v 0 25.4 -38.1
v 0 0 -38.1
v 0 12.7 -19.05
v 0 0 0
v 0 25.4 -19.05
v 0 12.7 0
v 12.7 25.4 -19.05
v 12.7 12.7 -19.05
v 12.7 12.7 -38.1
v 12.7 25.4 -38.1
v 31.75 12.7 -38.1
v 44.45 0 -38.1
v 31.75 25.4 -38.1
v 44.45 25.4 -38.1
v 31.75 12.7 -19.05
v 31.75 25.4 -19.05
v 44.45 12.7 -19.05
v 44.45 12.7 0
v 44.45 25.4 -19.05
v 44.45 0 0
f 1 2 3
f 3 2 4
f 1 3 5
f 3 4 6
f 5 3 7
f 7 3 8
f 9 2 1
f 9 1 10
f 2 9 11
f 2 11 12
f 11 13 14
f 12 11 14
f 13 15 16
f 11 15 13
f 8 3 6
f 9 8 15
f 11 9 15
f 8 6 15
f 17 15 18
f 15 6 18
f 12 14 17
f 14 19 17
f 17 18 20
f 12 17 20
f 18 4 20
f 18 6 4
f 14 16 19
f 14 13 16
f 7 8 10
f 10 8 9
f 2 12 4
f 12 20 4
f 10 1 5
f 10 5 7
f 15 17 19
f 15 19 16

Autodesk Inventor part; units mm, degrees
ref_plane "YZ Plane" through (0, 0, 0) normal (1, 0, 0) x (0, 1, 0)
ref_plane "XZ Plane" through (0, 0, 0) normal (0, 1, 0) x (-1, 0, 0)
ref_plane "XY Plane" through (0, 0, 0) normal (0, 0, 1) x (1, 0, 0)
sketch "Sketch1" plane through (0, 0, 0) normal (0, 0, 1) x (1, 0, 0)
  line L0 (0, 12.7) -> (44.45, 12.7)
  line L1 (44.45, 12.7) -> (44.45, 0)
  line L2 (44.45, 0) -> (0, 0)
  line L3 (0, 0) -> (0, 12.7)
  dimension "d0" = 44.45
  dimension "d1" = 12.7
extrude "Extrusion1" add sketch "Sketch1" against normal blind 38.1
sketch "Sketch2" plane through (0, 12.7, 0) normal (0, 1, 0) x (1, 0, 0)
  line L0 (0, 0) -> (0, 38.1) projected
  line L1 (0, 38.1) -> (44.45, 38.1) projected
  line L2 (0, 19.05) -> (12.7, 19.05)
  line L3 (12.7, 19.05) -> (12.7, 38.1)
  line L4 (12.7, 38.1) -> (0, 38.1)
  line L5 (0, 38.1) -> (0, 19.05)
  line L6 (44.45, 0) -> (44.45, 38.1) projected
  line L7 (31.75, 38.1) -> (44.45, 38.1)
  line L8 (44.45, 38.1) -> (44.45, 19.05)
  line L9 (44.45, 19.05) -> (31.75, 19.05)
  line L10 (31.75, 19.05) -> (31.75, 38.1)
  dimension "d4" = 12.7
  dimension "d5" = 19.05
  dimension "d6" = 19.05
  dimension "d7" = 12.7
extrude "Extrusion2" add sketch "Sketch2" along normal blind 12.7
properties part number "A2.6_Titus_SktechSheetA4"
